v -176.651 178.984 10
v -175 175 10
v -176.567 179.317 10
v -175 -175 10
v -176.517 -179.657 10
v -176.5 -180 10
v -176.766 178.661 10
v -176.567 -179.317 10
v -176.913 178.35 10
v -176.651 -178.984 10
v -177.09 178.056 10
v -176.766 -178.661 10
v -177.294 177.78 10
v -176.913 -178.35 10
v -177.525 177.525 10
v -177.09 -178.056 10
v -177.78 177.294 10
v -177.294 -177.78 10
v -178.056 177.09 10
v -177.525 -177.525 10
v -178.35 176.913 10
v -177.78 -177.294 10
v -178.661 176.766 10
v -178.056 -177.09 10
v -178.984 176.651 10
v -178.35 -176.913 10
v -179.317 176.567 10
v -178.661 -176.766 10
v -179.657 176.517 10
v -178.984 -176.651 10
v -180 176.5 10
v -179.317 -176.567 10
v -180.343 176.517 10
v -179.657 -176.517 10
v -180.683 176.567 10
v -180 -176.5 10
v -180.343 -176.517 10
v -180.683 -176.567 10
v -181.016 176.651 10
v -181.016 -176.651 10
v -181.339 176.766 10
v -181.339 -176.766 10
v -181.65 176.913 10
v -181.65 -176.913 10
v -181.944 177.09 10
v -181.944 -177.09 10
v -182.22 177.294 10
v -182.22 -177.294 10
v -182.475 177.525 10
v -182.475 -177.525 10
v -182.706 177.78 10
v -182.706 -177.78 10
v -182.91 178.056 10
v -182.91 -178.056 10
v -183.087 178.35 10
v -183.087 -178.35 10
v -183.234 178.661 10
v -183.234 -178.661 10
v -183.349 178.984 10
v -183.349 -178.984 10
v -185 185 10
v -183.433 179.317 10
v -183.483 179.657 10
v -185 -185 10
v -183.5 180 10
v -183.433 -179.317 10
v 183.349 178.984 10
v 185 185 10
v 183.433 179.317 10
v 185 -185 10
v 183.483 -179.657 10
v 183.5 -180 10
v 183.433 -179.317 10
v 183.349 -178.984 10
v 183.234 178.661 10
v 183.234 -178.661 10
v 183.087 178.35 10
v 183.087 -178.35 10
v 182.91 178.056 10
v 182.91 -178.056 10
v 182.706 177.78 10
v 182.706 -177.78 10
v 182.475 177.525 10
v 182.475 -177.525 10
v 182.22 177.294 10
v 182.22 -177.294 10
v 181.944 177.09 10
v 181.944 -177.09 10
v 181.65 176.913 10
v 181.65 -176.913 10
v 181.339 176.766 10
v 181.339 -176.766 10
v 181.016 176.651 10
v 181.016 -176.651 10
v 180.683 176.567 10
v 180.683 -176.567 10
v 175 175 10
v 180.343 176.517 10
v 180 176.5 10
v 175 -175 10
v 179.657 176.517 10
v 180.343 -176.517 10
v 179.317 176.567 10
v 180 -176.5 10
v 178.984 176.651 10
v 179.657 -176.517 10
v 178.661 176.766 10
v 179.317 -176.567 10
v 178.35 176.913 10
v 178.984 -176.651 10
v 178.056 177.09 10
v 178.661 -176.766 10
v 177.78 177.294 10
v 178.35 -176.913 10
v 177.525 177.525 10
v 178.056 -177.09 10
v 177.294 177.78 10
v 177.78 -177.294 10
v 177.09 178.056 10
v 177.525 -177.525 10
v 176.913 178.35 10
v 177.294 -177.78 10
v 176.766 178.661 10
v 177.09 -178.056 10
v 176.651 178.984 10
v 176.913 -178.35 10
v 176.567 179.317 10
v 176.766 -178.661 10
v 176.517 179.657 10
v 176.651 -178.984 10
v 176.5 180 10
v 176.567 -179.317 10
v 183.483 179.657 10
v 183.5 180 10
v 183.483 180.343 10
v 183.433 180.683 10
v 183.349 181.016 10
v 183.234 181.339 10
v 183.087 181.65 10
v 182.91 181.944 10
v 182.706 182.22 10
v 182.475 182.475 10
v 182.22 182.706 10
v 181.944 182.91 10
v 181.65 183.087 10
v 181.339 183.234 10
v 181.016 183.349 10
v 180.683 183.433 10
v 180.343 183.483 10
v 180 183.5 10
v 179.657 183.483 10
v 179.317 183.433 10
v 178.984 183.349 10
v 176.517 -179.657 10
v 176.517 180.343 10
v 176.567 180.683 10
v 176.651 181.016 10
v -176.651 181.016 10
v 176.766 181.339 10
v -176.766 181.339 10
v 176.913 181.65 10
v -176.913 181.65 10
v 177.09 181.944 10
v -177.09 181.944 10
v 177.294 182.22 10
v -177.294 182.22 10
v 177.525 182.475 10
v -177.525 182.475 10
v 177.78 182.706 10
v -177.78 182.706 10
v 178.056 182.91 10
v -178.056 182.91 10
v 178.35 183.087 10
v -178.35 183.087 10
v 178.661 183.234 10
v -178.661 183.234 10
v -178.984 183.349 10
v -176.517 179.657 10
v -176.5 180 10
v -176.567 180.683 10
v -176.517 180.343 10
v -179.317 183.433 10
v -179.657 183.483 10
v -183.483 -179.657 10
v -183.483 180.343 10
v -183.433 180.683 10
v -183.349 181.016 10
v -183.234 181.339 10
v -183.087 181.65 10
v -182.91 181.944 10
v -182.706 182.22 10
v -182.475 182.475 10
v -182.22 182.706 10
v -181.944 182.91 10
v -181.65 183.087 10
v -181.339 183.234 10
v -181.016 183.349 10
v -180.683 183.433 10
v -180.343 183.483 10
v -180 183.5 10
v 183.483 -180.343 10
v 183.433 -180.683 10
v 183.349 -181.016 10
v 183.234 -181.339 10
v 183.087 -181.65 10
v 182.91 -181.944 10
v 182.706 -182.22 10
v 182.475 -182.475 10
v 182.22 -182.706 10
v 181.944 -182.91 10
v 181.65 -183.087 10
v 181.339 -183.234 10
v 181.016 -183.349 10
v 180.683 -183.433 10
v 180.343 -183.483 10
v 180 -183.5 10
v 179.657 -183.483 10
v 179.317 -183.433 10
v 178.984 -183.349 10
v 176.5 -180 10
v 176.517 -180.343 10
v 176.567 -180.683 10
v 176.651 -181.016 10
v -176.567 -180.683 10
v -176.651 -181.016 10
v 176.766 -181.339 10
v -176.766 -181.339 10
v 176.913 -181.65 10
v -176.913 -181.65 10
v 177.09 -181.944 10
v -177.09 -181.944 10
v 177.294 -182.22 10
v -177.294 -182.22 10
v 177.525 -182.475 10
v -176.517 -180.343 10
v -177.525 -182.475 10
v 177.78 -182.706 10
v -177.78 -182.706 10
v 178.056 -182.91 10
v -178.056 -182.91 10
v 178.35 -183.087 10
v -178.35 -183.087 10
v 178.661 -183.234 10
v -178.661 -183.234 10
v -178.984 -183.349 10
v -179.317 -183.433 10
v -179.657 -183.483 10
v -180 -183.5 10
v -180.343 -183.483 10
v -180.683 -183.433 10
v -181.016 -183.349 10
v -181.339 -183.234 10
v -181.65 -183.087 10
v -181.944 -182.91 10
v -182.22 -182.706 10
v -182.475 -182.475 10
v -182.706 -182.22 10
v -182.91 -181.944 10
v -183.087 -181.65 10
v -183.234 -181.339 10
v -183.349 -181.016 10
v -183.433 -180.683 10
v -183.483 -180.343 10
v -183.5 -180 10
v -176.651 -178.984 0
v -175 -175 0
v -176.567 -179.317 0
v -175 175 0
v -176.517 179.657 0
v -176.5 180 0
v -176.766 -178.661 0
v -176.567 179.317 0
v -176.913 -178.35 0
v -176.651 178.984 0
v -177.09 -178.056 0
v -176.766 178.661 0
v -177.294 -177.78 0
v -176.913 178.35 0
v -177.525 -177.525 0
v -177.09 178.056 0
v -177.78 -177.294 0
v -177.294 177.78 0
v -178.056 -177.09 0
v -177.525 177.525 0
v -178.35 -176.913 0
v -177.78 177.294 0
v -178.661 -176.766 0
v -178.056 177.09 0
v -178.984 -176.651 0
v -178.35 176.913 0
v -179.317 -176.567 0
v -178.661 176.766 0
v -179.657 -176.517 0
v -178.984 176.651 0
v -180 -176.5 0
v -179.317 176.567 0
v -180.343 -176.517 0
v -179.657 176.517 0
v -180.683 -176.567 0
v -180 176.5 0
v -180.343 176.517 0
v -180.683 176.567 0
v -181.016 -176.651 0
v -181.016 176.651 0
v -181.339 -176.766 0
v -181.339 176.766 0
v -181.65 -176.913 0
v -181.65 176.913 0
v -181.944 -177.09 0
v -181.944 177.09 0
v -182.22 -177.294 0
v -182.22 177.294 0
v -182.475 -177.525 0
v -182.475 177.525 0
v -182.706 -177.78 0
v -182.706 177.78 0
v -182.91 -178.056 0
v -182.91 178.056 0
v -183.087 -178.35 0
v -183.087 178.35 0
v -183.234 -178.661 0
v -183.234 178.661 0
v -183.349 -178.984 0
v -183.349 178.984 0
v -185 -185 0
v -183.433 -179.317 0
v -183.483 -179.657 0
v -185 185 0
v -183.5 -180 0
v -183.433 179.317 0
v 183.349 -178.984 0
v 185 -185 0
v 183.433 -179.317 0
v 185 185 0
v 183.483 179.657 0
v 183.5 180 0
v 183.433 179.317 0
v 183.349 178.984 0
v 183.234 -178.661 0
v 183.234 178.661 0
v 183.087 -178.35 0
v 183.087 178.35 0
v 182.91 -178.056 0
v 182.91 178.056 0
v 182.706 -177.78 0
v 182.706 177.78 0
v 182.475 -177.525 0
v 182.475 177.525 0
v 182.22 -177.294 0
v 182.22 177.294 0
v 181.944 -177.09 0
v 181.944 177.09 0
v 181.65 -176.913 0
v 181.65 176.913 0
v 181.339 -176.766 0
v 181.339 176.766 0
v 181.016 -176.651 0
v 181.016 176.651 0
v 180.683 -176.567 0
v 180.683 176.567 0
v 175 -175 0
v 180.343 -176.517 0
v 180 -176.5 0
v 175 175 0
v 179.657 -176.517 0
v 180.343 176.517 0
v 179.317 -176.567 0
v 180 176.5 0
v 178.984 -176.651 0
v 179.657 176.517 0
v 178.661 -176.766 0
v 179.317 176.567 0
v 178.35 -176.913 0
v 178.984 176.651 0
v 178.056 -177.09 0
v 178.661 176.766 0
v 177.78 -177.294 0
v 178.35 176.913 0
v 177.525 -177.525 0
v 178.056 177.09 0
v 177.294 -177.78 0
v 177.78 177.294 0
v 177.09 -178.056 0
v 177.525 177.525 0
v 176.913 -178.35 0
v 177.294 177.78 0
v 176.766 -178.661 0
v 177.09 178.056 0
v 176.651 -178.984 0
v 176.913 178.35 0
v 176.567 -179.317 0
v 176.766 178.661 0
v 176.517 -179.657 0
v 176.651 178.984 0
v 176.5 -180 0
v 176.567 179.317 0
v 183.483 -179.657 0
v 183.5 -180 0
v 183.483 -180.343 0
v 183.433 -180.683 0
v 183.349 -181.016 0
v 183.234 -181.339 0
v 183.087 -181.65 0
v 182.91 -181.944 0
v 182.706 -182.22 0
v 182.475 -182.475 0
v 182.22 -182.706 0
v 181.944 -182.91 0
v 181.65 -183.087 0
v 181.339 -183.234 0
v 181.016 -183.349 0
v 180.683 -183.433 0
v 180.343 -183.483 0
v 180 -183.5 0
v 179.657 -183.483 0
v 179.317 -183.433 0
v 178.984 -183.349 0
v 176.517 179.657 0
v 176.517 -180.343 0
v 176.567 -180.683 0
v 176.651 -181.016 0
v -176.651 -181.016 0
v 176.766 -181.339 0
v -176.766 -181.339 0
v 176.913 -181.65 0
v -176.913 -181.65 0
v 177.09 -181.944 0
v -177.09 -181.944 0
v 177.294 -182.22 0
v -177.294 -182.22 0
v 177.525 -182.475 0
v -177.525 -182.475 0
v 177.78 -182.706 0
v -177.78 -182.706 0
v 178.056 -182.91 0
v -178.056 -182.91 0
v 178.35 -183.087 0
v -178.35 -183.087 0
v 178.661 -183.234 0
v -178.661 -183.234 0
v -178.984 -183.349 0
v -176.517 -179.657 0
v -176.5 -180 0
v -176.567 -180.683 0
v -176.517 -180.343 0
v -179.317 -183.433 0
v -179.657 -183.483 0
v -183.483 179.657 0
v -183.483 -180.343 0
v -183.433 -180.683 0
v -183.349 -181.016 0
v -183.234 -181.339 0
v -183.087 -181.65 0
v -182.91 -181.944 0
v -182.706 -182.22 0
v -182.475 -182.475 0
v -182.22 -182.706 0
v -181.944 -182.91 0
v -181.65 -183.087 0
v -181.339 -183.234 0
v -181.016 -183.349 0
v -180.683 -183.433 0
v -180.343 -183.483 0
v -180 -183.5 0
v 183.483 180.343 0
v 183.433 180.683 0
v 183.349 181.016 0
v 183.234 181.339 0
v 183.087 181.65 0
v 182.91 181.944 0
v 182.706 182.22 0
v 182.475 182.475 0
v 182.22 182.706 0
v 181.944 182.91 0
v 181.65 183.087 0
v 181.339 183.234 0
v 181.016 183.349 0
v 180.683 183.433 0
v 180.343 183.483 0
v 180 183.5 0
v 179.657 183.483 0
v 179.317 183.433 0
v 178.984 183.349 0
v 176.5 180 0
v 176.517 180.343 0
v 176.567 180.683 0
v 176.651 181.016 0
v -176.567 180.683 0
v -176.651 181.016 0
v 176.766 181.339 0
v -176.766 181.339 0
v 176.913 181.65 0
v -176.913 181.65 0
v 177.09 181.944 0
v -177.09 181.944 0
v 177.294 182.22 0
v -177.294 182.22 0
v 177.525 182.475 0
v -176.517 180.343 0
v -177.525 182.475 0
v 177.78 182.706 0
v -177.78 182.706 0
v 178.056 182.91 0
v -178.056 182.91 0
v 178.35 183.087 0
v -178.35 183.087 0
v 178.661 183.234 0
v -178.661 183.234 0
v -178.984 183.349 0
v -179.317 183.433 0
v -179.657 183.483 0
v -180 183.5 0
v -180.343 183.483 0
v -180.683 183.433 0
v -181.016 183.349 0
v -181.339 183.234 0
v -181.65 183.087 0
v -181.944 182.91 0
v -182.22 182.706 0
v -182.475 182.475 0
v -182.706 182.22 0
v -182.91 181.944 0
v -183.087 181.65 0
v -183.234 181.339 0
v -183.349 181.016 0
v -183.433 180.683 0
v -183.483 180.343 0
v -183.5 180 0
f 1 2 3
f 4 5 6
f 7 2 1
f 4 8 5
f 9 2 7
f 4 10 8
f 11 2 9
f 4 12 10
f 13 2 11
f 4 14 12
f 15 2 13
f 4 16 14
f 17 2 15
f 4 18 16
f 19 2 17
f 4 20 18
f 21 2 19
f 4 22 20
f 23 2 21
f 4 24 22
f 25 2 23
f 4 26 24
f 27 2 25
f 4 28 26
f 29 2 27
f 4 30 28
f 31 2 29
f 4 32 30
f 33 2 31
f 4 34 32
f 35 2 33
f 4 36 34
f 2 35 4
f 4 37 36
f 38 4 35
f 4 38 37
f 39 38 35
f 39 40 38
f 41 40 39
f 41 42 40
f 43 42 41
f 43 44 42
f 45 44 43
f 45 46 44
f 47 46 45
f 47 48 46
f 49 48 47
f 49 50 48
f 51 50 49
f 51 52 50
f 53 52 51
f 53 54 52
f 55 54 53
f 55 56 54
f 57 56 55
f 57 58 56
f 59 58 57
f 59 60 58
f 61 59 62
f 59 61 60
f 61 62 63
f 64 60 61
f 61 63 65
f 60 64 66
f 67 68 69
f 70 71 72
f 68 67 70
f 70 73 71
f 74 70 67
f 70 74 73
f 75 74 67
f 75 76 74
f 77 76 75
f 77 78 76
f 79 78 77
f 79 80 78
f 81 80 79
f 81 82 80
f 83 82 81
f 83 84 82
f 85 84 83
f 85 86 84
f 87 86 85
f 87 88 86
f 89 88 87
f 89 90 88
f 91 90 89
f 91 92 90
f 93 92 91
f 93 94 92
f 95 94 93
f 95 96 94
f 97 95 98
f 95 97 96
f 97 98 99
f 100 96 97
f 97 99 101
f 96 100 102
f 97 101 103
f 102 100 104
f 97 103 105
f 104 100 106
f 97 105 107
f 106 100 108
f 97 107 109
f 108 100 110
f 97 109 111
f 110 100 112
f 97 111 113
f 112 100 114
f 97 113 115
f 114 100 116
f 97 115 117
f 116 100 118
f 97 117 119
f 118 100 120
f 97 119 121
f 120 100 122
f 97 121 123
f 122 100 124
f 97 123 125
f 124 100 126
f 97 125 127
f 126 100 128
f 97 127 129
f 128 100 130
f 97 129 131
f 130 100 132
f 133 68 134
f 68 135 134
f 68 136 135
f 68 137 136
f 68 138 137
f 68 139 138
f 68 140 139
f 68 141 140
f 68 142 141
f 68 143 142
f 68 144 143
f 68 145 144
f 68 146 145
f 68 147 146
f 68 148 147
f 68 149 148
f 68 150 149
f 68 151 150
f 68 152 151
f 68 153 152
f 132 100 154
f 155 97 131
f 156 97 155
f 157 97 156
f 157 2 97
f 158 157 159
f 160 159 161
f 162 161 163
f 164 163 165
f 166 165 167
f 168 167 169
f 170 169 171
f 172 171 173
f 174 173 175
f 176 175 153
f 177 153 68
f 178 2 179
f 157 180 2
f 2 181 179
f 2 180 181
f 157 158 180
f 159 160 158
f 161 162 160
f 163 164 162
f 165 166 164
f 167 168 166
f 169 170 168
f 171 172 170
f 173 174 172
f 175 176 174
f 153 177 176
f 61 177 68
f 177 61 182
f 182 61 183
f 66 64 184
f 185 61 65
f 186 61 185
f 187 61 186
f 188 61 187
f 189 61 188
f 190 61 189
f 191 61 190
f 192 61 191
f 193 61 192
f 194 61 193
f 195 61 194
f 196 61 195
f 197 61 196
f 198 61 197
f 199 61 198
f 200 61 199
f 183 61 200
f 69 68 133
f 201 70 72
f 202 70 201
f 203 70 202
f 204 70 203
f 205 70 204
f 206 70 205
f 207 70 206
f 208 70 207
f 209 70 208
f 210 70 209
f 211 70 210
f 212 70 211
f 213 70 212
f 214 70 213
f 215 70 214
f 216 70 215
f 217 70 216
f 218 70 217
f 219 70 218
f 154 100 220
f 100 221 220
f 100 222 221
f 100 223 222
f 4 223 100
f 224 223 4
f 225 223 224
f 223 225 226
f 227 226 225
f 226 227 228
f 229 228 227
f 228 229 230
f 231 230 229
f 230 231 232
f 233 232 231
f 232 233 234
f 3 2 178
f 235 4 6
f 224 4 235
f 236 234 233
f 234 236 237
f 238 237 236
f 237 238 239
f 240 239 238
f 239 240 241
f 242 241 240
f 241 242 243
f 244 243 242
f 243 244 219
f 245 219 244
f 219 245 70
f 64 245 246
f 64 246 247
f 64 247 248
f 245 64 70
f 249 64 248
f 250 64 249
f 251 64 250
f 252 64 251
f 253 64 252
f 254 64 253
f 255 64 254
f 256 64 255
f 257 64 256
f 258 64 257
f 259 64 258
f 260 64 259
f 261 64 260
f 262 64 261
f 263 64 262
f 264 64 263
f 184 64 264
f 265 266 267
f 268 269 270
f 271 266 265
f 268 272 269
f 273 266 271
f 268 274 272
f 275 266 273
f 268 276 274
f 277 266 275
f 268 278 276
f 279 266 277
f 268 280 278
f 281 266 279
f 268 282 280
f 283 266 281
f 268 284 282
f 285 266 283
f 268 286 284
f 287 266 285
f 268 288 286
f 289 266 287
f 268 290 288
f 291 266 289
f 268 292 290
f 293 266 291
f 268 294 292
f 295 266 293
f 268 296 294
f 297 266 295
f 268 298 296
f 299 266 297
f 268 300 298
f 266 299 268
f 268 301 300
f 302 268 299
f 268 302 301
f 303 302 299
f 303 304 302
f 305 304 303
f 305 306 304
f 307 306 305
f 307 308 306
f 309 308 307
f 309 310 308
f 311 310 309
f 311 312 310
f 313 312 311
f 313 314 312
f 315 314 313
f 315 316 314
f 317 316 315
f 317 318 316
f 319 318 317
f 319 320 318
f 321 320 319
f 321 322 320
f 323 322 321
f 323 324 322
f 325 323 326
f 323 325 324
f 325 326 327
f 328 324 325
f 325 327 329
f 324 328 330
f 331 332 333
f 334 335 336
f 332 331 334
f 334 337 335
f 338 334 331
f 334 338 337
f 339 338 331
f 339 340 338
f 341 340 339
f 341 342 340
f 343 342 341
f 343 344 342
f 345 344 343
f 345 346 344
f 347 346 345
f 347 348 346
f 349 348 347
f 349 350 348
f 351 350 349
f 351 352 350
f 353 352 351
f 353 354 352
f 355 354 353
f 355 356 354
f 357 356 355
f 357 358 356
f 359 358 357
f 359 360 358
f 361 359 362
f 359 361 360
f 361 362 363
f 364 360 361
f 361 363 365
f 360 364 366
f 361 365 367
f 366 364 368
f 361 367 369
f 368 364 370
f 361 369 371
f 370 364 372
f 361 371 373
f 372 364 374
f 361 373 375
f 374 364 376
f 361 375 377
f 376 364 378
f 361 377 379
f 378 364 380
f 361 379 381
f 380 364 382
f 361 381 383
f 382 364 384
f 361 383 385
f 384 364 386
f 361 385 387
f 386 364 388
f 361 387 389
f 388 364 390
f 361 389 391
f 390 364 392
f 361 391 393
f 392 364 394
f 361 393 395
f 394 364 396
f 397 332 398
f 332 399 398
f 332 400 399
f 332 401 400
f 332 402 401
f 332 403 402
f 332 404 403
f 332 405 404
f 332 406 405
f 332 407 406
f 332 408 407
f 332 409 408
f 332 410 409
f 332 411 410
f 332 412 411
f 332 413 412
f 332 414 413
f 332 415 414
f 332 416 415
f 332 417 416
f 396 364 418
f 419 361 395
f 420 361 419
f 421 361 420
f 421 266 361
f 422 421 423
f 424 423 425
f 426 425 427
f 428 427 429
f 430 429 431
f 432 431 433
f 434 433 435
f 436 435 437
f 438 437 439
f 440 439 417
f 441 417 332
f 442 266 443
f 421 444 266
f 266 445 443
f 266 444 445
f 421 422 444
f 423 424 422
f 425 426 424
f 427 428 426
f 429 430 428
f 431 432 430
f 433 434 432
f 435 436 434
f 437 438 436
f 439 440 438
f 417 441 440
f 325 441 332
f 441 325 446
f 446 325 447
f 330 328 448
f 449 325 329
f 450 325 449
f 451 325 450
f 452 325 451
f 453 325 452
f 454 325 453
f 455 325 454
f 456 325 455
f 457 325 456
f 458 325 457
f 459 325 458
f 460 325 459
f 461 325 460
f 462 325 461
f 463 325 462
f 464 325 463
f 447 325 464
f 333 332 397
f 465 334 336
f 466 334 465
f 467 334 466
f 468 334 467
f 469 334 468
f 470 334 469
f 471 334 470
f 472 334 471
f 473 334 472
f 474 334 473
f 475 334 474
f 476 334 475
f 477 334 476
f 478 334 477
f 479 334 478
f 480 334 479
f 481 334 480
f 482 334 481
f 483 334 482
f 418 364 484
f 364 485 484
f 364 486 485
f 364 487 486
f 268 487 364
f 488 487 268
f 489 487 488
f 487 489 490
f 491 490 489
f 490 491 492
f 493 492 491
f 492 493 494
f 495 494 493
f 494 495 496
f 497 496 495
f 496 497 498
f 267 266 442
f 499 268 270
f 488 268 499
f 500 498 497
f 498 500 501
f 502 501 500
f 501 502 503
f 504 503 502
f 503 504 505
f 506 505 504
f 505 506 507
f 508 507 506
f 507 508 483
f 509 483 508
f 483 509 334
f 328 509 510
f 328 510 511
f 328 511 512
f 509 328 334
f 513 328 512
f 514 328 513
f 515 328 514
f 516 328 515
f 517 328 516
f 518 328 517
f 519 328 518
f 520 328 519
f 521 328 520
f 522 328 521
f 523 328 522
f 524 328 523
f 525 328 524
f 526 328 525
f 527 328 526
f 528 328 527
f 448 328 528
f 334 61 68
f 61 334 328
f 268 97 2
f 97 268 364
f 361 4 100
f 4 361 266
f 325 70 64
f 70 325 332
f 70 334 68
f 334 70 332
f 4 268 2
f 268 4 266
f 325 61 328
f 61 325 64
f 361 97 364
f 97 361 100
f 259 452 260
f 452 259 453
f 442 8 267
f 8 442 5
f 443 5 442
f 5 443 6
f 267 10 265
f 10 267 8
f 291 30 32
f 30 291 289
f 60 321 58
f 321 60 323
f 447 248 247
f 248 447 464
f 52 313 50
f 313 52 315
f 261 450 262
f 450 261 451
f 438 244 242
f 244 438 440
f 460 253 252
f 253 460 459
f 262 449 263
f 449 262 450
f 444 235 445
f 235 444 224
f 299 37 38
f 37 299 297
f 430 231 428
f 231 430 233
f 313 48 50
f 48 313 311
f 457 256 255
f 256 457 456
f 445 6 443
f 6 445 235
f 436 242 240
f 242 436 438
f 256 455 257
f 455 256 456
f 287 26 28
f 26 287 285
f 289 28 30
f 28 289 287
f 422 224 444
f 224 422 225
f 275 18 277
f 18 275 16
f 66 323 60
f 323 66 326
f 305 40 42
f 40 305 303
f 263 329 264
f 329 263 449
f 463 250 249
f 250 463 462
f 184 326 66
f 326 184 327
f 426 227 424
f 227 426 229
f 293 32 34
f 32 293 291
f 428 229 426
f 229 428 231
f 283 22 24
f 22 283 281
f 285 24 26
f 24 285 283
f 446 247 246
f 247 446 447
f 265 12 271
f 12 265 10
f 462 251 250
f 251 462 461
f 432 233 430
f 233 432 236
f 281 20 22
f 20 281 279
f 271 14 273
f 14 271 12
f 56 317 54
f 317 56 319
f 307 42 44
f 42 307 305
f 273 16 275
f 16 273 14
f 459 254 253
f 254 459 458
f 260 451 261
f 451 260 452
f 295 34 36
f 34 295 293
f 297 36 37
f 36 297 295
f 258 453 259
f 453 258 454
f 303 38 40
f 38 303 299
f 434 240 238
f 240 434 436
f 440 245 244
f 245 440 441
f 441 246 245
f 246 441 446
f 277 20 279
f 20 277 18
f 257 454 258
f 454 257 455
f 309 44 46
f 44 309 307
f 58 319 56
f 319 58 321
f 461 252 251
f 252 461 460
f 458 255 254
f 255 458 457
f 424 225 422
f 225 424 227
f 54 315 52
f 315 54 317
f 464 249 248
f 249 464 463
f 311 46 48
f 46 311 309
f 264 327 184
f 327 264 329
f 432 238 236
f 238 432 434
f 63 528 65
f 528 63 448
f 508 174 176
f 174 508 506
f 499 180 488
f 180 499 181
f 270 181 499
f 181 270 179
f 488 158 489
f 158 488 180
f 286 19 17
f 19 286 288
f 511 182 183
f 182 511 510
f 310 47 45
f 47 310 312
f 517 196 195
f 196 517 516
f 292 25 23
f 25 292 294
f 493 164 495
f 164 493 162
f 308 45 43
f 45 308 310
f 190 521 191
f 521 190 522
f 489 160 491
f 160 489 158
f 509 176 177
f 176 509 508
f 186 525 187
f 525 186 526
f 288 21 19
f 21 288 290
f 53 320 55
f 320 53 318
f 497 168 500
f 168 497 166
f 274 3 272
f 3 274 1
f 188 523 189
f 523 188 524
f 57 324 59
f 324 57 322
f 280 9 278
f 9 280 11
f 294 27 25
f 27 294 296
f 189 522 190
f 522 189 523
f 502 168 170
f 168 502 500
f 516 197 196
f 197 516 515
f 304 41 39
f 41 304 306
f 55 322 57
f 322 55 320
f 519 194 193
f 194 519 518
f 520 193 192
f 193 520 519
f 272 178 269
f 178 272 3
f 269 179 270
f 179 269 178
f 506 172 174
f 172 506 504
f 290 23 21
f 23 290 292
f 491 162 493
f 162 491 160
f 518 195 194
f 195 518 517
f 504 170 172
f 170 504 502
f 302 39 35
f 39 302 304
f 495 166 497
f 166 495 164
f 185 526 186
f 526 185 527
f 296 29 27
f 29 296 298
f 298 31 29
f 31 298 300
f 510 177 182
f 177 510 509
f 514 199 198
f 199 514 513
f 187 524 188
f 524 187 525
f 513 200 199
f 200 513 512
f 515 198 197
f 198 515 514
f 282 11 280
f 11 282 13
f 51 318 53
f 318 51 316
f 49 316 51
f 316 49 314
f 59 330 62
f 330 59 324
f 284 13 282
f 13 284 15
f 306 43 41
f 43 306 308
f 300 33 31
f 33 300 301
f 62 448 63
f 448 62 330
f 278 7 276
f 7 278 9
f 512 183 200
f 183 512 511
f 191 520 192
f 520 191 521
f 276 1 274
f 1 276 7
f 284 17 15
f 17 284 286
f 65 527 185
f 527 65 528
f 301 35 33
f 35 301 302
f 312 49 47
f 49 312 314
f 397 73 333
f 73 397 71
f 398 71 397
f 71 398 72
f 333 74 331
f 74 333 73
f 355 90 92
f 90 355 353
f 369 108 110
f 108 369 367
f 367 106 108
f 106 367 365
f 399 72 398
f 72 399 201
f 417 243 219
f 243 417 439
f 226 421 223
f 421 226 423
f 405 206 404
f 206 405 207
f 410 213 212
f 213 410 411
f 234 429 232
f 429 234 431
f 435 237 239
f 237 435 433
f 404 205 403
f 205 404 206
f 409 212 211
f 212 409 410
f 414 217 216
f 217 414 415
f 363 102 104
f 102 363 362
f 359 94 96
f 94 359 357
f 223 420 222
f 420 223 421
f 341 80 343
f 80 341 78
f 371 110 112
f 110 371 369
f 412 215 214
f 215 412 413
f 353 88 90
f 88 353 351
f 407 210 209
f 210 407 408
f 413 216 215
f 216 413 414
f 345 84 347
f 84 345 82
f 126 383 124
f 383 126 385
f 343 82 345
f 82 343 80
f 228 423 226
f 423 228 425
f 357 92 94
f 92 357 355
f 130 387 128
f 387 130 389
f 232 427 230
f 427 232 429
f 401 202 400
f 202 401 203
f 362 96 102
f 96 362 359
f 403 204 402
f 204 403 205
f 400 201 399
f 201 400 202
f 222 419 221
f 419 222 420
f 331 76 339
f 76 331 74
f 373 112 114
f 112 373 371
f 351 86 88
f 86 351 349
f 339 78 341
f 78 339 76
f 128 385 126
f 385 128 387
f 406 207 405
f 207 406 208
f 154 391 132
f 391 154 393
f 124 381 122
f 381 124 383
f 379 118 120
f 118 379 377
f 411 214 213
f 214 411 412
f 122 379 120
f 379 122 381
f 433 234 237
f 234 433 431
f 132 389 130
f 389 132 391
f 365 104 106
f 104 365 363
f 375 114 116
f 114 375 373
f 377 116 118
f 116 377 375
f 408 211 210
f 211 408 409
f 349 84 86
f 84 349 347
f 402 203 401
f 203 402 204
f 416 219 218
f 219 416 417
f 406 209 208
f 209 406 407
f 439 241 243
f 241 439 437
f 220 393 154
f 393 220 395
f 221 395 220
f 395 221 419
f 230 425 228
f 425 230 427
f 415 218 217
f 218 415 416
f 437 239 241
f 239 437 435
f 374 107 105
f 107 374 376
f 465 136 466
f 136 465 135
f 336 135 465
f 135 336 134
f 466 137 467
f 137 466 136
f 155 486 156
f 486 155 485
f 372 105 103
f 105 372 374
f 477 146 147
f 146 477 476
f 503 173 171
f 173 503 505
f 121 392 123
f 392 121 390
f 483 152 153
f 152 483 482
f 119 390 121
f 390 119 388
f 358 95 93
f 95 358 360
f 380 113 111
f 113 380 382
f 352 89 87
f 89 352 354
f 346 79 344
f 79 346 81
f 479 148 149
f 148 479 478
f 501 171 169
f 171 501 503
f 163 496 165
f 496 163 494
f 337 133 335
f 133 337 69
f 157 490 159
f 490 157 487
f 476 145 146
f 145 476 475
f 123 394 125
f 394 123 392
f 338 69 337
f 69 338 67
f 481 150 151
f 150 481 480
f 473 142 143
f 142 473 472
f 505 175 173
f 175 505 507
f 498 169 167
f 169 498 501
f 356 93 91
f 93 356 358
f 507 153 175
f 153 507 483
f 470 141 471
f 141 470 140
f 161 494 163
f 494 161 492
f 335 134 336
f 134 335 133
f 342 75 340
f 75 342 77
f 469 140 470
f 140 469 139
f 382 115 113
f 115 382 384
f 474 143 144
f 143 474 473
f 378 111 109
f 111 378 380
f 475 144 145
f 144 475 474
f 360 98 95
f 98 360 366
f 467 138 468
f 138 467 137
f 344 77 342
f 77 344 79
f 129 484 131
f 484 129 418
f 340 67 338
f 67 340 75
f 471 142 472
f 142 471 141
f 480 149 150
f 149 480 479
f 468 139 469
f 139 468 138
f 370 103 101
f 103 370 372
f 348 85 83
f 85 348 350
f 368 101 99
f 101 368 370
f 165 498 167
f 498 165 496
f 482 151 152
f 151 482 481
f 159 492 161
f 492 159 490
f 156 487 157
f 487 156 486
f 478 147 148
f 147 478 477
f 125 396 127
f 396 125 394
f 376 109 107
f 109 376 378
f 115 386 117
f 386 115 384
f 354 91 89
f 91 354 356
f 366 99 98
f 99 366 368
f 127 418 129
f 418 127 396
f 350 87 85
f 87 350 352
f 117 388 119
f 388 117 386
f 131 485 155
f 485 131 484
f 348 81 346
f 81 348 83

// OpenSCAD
// ring_64.scad - ring index 64 (z bottom = 640 mm)
$fn = 64; bar = 10; half_b = bar/2; outer = 370; half_outer = outer/2;
front_y = 180; back_y = -180; left_x = -180; right_x = 180;
x_centers = [-170, -100, -30, 40, 110, 180];
z_centers = [5, 85, 155, 225, 295, 365, 435, 505, 575, 645, 715]; ring_z = 640;
module place_box(cx, cy, sx, sy) { translate([cx - sx/2, cy - sy/2, 0]) cube([sx, sy, bar]); }

difference() { union() {
    for (x = x_centers) { place_box(x, front_y, bar, bar); place_box(x, back_y, bar, bar); }
    for (y = x_centers) { place_box(left_x, y, bar, bar); place_box(right_x, y, bar, bar); }
    for (zc = z_centers) if ((zc - half_b < ring_z + bar) && (zc + half_b > ring_z)) {
        translate([-half_outer, front_y - half_b, 0]) cube([outer, bar, bar]);
        translate([-half_outer, back_y - half_b, 0])  cube([outer, bar, bar]);
        translate([left_x - half_b, -half_outer, 0])  cube([bar, outer, bar]);
        translate([right_x - half_b, -half_outer, 0]) cube([bar, outer, bar]);
    }
  }
  for (cx = [-180, 180]) for (cy = [-180, 180]) translate([cx, cy, 0]) cylinder(h = bar, r = 3.5, $fn = 64);
}
